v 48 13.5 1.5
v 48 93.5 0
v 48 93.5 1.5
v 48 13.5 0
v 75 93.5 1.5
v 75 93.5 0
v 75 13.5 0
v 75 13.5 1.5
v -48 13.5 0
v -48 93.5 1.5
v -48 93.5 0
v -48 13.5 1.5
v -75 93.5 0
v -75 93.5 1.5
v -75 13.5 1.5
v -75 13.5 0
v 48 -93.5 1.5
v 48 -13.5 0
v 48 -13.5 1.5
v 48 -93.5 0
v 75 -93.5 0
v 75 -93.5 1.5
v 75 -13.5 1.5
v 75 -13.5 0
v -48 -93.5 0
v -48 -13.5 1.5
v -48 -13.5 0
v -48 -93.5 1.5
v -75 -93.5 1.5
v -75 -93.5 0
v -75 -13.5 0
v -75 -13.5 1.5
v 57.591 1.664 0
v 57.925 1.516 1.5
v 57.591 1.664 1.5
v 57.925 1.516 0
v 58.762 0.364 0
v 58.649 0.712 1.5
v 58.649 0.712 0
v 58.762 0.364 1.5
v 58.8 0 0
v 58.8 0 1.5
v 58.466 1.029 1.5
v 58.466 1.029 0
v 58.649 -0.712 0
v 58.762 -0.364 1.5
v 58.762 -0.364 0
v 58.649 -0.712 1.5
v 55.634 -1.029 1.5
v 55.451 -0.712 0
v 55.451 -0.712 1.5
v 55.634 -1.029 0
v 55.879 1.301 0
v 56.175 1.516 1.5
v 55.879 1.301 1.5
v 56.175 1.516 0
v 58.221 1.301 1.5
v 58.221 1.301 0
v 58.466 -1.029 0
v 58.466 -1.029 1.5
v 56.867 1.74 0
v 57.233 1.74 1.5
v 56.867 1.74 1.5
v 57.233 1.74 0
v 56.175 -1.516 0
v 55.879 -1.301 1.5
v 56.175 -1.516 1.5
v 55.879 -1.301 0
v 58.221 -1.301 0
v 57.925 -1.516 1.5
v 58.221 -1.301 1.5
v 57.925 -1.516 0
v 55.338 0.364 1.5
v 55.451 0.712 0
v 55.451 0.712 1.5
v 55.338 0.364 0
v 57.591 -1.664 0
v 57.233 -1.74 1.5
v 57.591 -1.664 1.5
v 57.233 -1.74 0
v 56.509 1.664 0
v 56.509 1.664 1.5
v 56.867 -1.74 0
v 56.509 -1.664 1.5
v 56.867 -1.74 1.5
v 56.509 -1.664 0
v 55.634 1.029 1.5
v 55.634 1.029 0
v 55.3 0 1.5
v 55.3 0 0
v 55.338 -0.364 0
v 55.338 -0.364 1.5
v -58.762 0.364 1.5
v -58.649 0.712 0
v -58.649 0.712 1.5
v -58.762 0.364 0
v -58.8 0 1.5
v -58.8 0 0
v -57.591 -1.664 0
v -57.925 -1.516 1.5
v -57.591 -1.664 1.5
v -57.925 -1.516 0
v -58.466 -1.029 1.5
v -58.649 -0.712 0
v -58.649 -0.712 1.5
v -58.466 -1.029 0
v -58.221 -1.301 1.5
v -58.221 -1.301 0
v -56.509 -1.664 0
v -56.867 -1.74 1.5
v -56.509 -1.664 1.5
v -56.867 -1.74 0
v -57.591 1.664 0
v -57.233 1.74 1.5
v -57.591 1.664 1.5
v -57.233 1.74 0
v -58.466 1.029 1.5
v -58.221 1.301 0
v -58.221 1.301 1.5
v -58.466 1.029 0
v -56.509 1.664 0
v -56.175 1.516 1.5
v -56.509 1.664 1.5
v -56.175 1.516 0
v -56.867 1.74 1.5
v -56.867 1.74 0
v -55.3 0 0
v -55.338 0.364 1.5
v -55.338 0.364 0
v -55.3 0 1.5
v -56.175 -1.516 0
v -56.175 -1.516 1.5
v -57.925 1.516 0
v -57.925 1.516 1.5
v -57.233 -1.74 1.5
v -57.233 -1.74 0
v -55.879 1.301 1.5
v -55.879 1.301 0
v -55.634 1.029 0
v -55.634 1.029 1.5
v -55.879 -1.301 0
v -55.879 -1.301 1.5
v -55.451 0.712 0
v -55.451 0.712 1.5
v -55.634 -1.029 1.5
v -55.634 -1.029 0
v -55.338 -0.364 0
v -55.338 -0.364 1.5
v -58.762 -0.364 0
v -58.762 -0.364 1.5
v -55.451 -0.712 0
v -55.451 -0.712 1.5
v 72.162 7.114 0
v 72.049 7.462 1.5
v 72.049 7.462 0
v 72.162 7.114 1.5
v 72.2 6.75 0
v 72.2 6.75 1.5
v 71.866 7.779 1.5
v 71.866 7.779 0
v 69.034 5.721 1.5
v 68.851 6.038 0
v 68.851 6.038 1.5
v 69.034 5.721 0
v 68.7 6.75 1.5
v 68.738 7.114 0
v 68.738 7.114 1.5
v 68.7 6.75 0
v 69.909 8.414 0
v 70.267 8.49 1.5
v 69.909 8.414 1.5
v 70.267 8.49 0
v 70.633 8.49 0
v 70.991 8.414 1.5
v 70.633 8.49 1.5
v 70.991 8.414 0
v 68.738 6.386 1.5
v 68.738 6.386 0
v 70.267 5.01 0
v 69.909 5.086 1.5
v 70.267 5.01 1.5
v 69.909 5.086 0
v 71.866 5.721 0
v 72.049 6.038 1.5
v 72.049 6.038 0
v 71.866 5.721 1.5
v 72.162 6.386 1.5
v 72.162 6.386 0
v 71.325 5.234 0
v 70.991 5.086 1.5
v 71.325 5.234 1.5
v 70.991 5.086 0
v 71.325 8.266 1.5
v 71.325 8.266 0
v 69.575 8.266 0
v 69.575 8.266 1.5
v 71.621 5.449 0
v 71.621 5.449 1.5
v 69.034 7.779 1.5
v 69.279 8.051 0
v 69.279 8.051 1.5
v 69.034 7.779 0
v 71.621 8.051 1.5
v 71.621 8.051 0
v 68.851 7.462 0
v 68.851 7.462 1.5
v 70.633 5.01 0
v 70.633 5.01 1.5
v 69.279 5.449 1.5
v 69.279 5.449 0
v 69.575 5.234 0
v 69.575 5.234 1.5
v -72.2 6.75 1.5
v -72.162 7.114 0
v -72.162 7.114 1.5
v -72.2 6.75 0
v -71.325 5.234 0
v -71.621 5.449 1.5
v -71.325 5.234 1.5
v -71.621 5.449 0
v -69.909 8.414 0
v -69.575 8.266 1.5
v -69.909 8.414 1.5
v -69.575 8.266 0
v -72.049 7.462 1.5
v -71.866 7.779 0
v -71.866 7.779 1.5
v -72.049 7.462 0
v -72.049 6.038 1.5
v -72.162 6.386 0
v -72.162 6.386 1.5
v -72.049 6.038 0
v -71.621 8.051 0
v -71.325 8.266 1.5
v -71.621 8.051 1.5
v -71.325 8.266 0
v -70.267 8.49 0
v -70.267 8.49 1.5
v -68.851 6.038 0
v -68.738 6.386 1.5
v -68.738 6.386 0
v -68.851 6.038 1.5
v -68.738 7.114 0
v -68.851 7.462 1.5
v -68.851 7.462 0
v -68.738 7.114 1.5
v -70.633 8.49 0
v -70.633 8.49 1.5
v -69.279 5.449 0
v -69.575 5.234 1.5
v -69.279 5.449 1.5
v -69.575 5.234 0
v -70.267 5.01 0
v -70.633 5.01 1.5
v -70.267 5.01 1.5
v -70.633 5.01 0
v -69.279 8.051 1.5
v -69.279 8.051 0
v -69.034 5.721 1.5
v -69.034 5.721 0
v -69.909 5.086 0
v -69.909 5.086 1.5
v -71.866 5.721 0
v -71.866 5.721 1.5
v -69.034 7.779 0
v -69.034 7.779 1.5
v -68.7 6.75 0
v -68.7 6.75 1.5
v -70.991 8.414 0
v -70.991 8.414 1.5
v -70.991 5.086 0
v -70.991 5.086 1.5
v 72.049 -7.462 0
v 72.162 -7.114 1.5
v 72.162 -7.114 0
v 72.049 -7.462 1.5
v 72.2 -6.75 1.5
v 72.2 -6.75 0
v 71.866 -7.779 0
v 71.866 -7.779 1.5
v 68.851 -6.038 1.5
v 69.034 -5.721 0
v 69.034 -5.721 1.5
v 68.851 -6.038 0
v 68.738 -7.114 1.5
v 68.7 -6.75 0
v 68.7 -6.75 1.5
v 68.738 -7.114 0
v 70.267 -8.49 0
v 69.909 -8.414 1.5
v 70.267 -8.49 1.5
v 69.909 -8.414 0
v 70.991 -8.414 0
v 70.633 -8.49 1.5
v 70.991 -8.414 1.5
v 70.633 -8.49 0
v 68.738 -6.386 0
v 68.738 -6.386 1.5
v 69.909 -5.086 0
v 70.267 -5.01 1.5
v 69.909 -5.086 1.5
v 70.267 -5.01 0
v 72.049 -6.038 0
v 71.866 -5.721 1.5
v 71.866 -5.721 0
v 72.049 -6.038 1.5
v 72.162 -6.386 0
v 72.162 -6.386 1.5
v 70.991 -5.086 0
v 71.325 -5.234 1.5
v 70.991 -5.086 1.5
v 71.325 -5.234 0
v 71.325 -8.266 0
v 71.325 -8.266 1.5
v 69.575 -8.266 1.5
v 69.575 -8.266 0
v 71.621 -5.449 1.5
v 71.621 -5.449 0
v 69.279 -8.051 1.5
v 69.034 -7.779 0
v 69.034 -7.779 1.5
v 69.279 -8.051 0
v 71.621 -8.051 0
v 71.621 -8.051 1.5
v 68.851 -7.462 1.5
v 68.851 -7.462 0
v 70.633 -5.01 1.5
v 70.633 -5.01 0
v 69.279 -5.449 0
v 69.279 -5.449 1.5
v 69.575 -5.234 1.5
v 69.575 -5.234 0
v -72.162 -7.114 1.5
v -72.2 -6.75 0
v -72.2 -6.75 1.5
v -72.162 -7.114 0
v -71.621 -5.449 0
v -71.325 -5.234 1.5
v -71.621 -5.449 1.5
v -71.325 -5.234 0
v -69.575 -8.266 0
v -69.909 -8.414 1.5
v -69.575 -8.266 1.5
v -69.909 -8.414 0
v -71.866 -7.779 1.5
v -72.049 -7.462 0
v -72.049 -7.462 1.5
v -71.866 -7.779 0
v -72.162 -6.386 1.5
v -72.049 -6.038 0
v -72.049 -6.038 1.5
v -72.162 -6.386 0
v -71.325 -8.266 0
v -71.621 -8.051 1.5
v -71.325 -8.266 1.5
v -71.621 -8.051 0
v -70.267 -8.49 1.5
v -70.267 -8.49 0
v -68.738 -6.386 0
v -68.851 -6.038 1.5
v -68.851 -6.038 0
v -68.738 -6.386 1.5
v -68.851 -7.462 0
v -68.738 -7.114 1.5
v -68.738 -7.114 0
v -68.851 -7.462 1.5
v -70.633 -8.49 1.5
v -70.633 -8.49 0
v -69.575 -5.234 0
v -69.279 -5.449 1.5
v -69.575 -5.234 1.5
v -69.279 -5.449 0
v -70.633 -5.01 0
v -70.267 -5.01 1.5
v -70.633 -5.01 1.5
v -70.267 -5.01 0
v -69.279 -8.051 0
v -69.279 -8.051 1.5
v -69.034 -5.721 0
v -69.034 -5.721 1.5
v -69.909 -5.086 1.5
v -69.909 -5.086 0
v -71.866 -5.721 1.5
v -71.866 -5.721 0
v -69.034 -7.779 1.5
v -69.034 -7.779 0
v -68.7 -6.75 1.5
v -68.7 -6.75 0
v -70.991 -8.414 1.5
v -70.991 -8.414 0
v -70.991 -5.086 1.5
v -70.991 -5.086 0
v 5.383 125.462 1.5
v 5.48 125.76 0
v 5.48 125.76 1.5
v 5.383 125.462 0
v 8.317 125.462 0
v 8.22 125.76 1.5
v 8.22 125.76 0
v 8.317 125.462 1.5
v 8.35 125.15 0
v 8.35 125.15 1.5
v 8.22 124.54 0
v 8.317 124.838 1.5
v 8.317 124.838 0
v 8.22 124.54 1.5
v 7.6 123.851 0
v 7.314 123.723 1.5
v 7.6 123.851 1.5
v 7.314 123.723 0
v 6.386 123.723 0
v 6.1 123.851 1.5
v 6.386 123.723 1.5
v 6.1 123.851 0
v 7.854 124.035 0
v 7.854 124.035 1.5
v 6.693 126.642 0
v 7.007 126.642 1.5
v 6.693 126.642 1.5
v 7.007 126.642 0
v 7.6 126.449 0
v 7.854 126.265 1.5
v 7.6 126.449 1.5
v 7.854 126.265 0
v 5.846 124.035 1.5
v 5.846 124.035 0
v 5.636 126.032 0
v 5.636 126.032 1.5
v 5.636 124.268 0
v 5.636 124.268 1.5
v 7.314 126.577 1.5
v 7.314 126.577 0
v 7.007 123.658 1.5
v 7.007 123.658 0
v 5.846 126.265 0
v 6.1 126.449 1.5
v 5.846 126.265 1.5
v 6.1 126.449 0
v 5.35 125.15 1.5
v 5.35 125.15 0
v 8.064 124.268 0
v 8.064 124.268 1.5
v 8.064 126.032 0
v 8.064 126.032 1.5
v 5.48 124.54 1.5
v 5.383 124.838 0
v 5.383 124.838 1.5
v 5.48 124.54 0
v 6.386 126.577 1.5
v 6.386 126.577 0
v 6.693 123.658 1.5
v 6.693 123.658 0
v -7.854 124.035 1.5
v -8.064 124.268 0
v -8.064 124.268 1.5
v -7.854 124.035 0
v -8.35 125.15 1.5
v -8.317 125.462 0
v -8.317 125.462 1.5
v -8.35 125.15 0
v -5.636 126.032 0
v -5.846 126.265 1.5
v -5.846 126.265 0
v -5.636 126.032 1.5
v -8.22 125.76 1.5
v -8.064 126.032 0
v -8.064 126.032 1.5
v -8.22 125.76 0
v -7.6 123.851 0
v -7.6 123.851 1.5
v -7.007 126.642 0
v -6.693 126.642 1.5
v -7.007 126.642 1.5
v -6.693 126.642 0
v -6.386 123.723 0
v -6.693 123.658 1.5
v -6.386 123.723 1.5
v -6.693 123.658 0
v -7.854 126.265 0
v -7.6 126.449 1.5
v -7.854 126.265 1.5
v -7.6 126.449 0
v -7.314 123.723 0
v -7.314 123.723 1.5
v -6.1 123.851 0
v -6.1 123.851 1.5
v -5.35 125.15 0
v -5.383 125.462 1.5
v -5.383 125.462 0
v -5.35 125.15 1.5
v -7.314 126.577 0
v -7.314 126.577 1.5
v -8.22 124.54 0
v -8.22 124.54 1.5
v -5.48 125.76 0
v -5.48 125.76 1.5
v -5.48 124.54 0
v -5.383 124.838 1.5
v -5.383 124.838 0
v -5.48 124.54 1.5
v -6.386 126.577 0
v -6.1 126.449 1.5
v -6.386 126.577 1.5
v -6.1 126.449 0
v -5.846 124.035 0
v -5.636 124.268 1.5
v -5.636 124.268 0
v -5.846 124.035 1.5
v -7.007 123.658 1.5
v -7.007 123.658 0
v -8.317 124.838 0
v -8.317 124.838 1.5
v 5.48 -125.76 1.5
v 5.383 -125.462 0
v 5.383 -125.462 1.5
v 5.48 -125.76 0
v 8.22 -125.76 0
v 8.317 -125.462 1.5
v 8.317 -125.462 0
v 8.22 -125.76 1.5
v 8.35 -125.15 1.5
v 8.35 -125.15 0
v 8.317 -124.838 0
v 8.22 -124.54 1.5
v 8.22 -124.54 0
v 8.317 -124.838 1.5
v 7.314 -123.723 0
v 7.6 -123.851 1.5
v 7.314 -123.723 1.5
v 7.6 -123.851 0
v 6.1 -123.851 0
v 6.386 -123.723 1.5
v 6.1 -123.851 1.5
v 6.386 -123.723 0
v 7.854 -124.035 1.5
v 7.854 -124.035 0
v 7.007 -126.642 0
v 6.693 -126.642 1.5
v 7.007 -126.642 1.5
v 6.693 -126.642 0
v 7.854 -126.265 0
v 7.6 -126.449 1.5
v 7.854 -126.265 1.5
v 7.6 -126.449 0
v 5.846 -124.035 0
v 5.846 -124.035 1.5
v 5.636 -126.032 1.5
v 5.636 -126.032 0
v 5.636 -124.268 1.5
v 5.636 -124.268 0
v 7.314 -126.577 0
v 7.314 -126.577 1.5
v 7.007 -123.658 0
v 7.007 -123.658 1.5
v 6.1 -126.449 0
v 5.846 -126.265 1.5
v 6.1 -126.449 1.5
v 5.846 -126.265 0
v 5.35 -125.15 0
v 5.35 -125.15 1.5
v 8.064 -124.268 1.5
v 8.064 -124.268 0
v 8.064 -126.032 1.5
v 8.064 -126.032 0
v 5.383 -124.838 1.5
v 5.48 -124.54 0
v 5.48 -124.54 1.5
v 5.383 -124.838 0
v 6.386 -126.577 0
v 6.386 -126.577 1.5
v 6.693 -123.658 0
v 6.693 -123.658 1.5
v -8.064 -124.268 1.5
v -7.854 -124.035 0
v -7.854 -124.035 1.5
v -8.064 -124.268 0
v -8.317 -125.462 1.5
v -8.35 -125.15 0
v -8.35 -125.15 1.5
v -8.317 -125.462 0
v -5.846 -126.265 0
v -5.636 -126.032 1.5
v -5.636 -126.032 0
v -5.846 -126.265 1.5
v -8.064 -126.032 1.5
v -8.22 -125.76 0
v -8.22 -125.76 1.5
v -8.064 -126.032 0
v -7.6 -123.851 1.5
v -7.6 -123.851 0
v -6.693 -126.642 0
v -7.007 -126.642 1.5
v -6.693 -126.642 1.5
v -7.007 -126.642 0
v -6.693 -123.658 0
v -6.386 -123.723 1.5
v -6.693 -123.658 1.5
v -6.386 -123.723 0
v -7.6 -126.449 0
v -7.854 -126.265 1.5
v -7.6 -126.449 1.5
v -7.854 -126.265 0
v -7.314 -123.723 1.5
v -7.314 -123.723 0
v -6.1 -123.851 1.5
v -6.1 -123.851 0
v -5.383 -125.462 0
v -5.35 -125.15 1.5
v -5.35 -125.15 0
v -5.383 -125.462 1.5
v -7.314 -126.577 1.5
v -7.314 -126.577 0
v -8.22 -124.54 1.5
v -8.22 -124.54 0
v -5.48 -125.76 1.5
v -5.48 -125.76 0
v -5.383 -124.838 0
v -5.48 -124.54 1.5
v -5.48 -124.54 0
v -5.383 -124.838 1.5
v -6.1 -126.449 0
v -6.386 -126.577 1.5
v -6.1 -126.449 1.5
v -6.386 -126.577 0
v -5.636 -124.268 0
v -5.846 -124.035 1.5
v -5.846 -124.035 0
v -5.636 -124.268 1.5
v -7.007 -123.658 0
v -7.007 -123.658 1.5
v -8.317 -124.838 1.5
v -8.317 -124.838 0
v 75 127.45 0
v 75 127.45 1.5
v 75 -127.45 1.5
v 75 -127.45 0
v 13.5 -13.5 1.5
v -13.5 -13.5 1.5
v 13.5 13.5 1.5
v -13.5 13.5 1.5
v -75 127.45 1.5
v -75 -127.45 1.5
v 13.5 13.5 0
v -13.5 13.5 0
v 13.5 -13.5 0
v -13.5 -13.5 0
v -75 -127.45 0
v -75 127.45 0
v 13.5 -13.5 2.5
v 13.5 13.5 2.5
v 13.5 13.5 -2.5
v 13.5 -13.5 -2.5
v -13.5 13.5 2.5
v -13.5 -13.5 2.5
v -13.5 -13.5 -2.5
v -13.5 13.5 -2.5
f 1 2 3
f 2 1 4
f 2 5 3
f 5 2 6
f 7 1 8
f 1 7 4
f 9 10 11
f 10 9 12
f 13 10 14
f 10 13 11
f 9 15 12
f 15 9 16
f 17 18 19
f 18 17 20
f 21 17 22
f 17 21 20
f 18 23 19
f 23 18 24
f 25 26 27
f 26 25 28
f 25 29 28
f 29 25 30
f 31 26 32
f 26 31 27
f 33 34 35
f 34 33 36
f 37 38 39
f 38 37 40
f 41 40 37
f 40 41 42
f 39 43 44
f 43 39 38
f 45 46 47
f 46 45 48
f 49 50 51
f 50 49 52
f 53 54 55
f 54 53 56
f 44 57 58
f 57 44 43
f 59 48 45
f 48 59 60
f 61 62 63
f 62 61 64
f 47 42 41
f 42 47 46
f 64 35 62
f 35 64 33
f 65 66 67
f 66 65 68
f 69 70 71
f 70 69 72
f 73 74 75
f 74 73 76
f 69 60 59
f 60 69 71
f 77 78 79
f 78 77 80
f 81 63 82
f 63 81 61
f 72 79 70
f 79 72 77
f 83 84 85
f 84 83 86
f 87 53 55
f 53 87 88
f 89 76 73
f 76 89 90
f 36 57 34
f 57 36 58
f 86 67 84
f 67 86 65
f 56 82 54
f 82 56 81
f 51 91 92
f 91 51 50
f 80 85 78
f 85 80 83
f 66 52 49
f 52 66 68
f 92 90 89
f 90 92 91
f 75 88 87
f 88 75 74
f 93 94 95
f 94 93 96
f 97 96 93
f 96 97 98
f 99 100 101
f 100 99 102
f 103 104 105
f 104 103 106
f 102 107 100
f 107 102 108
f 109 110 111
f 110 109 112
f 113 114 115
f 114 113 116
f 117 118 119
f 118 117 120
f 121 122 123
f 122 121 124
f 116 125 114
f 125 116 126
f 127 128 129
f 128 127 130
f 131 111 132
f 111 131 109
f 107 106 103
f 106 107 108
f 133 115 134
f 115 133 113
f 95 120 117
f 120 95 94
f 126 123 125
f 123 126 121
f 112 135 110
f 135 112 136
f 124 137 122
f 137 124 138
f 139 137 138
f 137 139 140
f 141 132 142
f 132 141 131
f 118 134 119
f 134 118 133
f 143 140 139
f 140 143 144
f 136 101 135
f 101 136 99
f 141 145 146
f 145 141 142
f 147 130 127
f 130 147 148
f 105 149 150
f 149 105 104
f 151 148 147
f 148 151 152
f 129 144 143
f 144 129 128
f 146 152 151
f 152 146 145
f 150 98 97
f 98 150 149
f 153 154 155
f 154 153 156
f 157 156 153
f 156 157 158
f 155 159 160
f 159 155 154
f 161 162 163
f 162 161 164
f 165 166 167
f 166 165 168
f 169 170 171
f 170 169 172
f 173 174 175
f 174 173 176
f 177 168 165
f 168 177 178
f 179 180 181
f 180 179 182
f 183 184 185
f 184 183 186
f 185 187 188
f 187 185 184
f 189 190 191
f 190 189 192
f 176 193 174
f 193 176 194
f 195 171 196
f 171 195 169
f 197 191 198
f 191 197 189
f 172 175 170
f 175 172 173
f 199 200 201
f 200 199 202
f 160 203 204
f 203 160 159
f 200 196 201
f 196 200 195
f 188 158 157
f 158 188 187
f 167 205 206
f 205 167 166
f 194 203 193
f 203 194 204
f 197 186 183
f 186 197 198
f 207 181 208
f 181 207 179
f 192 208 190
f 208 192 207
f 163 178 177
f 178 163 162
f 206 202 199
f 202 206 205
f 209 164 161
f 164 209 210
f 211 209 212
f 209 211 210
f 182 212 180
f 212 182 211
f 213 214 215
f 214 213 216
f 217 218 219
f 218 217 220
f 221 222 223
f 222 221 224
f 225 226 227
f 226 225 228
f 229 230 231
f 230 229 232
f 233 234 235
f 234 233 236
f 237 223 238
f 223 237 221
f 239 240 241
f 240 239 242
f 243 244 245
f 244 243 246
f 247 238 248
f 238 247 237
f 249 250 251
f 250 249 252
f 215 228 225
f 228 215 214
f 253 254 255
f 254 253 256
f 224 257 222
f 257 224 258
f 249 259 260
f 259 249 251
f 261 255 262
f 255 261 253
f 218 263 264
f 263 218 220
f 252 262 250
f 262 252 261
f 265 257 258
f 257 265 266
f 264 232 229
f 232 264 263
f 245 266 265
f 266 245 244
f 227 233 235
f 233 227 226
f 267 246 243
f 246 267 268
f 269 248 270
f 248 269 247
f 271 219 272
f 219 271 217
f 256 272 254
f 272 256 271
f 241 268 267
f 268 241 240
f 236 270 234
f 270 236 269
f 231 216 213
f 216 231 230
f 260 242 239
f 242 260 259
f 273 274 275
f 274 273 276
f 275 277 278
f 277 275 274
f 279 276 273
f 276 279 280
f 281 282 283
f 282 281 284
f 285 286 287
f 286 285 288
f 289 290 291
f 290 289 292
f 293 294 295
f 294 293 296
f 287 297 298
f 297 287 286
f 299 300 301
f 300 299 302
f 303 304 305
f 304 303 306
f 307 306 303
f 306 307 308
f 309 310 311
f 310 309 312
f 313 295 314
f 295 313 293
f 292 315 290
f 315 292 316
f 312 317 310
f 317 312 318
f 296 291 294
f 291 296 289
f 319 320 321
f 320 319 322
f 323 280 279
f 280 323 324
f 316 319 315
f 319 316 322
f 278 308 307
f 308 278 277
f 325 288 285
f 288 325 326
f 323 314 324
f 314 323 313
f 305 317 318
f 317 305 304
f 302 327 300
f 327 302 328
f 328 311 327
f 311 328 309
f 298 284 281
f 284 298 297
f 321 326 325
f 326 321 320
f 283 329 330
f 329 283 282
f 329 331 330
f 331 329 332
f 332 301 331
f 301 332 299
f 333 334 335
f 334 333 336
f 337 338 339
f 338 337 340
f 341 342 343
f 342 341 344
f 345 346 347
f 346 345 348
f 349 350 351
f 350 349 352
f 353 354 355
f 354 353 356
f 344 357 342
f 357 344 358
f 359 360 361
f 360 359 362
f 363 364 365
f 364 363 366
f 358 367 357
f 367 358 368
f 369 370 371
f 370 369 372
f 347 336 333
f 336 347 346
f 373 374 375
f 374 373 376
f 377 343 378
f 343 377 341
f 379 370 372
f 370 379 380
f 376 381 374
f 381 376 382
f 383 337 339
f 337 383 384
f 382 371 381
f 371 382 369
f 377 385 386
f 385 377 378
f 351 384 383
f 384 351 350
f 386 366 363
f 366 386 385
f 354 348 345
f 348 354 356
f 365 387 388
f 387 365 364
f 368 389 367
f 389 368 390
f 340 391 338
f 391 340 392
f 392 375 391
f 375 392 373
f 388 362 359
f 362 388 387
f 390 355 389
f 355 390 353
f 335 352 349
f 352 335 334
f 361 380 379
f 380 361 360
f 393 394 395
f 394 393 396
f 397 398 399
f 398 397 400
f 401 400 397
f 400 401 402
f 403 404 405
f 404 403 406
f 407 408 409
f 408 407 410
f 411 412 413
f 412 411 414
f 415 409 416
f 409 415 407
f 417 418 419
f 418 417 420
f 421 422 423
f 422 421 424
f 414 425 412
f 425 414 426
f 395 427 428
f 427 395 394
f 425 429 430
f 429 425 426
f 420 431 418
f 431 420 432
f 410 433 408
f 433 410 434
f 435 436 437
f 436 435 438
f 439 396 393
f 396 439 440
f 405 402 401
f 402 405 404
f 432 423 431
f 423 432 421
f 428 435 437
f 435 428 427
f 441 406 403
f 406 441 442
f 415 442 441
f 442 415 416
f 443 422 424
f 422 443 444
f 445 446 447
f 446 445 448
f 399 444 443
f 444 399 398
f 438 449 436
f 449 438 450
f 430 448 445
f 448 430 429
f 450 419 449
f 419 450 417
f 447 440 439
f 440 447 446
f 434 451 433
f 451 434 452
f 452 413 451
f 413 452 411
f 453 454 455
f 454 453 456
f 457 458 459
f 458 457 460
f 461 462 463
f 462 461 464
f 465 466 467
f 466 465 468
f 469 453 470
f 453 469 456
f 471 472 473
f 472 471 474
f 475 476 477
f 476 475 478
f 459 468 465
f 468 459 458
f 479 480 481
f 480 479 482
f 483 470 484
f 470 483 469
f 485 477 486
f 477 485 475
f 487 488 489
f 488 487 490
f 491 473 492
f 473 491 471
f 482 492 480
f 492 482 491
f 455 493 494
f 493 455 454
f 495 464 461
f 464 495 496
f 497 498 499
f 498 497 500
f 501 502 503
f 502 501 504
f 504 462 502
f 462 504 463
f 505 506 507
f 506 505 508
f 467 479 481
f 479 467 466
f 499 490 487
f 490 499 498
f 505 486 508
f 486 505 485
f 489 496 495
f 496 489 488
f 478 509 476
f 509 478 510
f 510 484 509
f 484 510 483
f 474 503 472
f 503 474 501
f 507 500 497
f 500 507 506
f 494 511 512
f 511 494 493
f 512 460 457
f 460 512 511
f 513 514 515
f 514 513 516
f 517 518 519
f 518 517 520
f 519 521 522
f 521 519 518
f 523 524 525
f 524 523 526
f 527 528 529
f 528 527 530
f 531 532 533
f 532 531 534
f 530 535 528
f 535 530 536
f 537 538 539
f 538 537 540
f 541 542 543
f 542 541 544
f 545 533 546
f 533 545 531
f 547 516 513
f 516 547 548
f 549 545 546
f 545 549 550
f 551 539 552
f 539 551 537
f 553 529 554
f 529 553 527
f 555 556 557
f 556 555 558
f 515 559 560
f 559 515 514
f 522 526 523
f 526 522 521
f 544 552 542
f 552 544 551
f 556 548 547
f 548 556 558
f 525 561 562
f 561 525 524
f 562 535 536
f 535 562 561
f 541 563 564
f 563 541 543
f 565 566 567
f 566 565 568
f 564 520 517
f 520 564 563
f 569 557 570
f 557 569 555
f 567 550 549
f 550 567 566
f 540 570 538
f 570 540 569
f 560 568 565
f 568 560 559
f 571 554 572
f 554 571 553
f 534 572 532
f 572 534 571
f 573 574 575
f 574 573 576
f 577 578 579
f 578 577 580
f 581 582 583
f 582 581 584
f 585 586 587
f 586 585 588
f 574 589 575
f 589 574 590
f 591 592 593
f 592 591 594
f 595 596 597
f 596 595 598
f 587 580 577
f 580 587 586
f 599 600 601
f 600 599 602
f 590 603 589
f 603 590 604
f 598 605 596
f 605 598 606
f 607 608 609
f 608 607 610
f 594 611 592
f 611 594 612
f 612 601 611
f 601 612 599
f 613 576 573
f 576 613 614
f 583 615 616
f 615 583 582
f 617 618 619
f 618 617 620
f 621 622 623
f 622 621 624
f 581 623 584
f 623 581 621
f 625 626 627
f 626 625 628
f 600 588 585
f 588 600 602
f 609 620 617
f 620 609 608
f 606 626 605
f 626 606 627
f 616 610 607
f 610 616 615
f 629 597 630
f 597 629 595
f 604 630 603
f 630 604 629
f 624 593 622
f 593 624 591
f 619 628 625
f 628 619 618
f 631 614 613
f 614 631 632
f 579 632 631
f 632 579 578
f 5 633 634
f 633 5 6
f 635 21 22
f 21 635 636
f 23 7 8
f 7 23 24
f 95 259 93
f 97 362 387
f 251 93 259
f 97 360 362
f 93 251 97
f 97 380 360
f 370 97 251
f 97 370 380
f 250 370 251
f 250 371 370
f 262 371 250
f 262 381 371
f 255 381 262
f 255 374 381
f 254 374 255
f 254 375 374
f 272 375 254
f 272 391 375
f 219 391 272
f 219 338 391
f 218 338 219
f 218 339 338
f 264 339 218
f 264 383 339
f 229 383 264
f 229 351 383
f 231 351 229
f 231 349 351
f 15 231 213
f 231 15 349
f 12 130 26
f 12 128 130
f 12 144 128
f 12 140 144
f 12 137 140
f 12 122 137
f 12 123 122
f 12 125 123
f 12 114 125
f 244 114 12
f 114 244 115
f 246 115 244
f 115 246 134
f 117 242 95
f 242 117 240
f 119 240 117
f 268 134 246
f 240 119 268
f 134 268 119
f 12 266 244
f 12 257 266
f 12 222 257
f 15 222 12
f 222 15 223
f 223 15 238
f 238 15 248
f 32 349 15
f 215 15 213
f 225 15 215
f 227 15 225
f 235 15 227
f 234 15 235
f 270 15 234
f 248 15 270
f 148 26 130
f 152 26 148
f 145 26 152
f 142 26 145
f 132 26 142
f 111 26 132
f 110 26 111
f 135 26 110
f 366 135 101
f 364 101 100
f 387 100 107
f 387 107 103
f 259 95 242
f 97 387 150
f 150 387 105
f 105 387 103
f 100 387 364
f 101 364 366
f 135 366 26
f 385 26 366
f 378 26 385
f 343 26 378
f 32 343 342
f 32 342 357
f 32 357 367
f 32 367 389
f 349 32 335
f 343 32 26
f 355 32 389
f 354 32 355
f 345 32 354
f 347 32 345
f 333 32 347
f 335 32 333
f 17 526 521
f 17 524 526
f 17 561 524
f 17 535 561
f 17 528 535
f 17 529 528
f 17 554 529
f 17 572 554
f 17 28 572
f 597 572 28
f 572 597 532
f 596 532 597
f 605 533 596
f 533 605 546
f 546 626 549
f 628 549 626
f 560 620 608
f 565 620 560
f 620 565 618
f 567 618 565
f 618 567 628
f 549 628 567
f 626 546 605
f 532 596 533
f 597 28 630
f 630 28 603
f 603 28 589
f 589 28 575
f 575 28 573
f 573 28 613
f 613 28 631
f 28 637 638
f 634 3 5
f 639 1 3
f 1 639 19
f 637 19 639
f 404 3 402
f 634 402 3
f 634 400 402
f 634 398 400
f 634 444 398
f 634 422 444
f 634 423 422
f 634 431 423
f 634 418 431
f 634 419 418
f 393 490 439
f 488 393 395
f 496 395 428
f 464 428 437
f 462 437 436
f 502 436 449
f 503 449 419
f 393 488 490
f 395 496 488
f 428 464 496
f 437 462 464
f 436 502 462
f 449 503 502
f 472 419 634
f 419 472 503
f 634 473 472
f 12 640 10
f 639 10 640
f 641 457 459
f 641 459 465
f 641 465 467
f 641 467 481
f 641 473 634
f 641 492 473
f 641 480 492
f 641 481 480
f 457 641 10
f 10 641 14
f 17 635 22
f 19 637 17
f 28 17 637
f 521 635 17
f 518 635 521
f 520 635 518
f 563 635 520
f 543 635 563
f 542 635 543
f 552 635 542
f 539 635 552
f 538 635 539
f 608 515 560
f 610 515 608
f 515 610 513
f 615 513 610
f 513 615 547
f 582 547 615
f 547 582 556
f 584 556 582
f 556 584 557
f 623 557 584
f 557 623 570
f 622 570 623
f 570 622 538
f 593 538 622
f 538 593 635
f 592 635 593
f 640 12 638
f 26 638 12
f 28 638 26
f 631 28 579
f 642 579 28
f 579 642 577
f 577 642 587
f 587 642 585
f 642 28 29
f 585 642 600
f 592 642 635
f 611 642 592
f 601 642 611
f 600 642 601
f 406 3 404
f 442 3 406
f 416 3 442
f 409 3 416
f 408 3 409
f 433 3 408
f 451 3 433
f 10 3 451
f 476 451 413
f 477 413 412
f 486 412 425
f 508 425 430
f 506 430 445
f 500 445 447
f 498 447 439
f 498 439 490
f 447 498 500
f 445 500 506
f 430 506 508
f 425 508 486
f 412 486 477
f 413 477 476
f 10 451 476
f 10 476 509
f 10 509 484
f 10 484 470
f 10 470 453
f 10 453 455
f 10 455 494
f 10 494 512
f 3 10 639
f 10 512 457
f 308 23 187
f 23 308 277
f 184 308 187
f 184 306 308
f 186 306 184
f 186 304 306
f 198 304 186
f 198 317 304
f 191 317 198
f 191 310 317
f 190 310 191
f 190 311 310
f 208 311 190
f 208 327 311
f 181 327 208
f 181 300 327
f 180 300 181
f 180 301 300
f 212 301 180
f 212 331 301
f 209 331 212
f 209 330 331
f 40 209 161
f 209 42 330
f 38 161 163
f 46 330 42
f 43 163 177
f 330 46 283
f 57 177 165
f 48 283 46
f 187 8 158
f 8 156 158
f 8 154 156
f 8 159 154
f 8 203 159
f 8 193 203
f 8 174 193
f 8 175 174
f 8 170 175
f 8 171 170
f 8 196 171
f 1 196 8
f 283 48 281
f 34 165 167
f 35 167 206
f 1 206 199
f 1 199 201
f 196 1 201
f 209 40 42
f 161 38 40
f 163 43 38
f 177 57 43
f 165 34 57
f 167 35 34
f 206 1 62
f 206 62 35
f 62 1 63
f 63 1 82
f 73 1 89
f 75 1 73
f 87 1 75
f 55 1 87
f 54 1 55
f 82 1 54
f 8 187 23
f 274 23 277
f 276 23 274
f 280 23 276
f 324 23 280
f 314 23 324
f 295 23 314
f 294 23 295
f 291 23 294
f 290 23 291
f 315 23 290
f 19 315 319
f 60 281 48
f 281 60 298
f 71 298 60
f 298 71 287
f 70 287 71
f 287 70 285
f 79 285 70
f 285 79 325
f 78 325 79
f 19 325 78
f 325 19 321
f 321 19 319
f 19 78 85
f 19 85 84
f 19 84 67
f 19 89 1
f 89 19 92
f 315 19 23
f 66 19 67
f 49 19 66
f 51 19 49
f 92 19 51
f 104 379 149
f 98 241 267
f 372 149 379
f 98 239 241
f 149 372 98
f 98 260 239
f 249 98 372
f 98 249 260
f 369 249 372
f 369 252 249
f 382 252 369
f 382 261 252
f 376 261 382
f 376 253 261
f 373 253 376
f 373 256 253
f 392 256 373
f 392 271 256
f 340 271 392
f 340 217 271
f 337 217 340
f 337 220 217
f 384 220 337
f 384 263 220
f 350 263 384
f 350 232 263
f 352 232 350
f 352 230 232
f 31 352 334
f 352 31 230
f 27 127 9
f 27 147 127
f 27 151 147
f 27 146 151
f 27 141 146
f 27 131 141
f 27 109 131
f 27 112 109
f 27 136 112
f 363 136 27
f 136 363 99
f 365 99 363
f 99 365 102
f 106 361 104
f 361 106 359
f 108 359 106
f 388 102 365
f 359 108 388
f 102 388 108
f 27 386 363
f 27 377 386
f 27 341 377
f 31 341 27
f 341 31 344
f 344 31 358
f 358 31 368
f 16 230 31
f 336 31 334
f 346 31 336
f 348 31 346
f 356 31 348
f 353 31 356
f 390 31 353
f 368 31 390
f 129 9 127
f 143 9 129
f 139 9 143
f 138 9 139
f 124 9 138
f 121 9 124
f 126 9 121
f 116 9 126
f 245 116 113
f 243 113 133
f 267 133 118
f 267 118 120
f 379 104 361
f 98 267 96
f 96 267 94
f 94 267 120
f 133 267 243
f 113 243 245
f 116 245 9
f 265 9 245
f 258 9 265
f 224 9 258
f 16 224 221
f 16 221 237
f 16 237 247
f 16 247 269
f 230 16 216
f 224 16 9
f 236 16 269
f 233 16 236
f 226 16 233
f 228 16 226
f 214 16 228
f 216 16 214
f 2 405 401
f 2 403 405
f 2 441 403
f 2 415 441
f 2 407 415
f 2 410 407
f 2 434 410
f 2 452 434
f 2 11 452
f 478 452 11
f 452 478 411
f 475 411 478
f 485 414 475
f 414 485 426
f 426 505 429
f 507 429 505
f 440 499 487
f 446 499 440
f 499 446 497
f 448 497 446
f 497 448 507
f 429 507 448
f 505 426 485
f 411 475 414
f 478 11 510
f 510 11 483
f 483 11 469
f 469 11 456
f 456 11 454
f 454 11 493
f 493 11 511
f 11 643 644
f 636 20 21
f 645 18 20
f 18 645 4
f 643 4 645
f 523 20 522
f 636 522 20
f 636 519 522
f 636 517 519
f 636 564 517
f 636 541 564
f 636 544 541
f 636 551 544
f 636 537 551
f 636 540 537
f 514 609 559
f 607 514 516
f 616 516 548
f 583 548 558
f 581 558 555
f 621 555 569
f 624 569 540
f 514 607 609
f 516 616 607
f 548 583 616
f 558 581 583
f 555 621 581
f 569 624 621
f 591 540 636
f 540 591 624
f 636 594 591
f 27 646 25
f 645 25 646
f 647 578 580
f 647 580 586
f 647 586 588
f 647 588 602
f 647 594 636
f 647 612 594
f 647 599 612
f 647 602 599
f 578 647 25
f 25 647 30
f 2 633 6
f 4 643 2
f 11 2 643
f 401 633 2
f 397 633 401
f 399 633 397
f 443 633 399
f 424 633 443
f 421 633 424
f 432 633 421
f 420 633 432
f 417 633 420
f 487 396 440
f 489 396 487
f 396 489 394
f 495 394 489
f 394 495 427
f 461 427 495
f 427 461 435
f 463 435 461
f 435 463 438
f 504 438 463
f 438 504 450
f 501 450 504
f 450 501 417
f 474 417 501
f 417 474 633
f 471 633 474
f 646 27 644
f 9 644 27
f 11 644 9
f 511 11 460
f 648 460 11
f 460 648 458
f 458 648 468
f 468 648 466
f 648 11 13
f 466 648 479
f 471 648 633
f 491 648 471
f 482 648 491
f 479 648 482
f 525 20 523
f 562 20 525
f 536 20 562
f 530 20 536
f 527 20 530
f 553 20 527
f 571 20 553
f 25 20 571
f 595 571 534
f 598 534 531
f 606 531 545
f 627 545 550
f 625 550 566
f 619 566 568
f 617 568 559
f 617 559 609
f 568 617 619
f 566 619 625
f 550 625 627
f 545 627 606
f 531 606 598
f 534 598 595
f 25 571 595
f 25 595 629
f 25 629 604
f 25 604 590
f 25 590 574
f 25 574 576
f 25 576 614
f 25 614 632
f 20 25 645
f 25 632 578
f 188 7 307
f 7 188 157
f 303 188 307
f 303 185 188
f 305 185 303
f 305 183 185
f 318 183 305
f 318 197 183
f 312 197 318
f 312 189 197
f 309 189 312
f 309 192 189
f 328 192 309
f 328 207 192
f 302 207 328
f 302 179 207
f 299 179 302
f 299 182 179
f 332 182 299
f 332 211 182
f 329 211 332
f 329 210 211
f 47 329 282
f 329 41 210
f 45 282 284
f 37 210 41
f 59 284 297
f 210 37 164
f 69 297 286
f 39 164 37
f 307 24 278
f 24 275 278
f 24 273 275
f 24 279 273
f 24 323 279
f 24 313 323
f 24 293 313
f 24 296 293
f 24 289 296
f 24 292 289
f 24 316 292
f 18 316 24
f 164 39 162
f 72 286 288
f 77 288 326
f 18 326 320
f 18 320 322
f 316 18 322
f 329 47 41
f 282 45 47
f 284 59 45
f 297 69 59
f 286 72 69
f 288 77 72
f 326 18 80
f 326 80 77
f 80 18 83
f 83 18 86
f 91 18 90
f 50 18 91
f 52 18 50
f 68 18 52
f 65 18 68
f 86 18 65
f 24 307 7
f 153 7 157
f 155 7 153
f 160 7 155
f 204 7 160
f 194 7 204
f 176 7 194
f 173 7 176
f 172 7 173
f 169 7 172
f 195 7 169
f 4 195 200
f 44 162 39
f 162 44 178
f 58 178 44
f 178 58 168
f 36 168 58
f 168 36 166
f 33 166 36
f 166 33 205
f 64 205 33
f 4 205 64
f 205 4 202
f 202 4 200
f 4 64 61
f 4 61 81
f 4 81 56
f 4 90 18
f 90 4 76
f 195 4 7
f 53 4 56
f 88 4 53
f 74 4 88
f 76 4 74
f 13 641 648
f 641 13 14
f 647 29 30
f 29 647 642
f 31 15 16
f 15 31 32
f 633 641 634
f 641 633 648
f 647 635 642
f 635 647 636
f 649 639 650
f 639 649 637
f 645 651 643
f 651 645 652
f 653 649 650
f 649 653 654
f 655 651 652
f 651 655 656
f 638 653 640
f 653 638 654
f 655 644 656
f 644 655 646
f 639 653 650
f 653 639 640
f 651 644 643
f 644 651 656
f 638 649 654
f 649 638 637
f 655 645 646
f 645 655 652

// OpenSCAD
// file: ../Lib/mirrorcopy.scad
module mirrorCopy(vec=[1,0,0], vec2=[0,0,0], vec3=[0,0,0]){
    
    //echo(str("Vec1=",vec," Vec2=", vec2, " Vec3=", vec3));
    children();
    mirror(vec) children();

    if(vec2){    
        mirror(vec2){
            children();
            mirror(vec) children();
        }
    }

    if(vec3){
        mirror(vec3){
            children();
            mirror(vec) children();
            mirror(vec2){
                children();
                mirror(vec) children();
            }
        }
    }
    
} 

mirrorCopy([1,0,0])color("green")translate([5,10,0])cylinder(h=1,d=5,center=true);
mirrorCopy([1,0,0],[0,1,0])color("blue")translate([10,5,0])cylinder(h=1,d=5,center=true);
mirrorCopy([1,0,0],[0,1,0],[0,0,1])color("red")translate([15,10,5])cylinder(h=1,d=5,center=true);
// main file
use <../Lib/mirrorcopy.scad>
$fn = 30;
basePlateDims = [150,121.2+4+129.7,1.5];
snootHolesDia = 3.0;
sideHolesDia = 3.5;

module wheelCutouts(){
    mirrorCopy([0,1,0])mirrorCopy([1,0,0])
        translate([((basePlateDims.x+35)/2)-27,40+(27/2),0])
            cube([35,80,basePlateDims.z+1], center=true);
}
module wingHoles(){
    mirrorCopy([1,0,0])
    translate([(basePlateDims.x/2)-(16.2+(sideHolesDia/2)),0,0])
        #cylinder(h=basePlateDims.z+1, d=sideHolesDia, center=true);
    mirrorCopy([0,1,0])mirrorCopy([1,0,0])
        translate([(basePlateDims.x/2)-(2.8+(sideHolesDia/2)),(10+sideHolesDia)/2,0])
            #cylinder(h=basePlateDims.z+1, d=sideHolesDia, center=true);
}
module snootHoles(){
    mirrorCopy([0,1,0])mirrorCopy([1,0,0])
        translate([(10.7+snootHolesDia)/2,basePlateDims.y/2-(.8+(snootHolesDia/2)),0])
            #cylinder(h=basePlateDims.z+1, d=snootHolesDia, center=true);
}

difference(){
    union(){
        translate([0,0,basePlateDims.z/2]){
            // Base plate
            cube(basePlateDims, center=true);
        }
    }
    union(){
        translate([0,0,basePlateDims.z/2]){
            wheelCutouts();
            wingHoles();
snootHoles();

        }
    }
}
    
color("green")translate([0,0,0])cube([27,27,5], center=true);
